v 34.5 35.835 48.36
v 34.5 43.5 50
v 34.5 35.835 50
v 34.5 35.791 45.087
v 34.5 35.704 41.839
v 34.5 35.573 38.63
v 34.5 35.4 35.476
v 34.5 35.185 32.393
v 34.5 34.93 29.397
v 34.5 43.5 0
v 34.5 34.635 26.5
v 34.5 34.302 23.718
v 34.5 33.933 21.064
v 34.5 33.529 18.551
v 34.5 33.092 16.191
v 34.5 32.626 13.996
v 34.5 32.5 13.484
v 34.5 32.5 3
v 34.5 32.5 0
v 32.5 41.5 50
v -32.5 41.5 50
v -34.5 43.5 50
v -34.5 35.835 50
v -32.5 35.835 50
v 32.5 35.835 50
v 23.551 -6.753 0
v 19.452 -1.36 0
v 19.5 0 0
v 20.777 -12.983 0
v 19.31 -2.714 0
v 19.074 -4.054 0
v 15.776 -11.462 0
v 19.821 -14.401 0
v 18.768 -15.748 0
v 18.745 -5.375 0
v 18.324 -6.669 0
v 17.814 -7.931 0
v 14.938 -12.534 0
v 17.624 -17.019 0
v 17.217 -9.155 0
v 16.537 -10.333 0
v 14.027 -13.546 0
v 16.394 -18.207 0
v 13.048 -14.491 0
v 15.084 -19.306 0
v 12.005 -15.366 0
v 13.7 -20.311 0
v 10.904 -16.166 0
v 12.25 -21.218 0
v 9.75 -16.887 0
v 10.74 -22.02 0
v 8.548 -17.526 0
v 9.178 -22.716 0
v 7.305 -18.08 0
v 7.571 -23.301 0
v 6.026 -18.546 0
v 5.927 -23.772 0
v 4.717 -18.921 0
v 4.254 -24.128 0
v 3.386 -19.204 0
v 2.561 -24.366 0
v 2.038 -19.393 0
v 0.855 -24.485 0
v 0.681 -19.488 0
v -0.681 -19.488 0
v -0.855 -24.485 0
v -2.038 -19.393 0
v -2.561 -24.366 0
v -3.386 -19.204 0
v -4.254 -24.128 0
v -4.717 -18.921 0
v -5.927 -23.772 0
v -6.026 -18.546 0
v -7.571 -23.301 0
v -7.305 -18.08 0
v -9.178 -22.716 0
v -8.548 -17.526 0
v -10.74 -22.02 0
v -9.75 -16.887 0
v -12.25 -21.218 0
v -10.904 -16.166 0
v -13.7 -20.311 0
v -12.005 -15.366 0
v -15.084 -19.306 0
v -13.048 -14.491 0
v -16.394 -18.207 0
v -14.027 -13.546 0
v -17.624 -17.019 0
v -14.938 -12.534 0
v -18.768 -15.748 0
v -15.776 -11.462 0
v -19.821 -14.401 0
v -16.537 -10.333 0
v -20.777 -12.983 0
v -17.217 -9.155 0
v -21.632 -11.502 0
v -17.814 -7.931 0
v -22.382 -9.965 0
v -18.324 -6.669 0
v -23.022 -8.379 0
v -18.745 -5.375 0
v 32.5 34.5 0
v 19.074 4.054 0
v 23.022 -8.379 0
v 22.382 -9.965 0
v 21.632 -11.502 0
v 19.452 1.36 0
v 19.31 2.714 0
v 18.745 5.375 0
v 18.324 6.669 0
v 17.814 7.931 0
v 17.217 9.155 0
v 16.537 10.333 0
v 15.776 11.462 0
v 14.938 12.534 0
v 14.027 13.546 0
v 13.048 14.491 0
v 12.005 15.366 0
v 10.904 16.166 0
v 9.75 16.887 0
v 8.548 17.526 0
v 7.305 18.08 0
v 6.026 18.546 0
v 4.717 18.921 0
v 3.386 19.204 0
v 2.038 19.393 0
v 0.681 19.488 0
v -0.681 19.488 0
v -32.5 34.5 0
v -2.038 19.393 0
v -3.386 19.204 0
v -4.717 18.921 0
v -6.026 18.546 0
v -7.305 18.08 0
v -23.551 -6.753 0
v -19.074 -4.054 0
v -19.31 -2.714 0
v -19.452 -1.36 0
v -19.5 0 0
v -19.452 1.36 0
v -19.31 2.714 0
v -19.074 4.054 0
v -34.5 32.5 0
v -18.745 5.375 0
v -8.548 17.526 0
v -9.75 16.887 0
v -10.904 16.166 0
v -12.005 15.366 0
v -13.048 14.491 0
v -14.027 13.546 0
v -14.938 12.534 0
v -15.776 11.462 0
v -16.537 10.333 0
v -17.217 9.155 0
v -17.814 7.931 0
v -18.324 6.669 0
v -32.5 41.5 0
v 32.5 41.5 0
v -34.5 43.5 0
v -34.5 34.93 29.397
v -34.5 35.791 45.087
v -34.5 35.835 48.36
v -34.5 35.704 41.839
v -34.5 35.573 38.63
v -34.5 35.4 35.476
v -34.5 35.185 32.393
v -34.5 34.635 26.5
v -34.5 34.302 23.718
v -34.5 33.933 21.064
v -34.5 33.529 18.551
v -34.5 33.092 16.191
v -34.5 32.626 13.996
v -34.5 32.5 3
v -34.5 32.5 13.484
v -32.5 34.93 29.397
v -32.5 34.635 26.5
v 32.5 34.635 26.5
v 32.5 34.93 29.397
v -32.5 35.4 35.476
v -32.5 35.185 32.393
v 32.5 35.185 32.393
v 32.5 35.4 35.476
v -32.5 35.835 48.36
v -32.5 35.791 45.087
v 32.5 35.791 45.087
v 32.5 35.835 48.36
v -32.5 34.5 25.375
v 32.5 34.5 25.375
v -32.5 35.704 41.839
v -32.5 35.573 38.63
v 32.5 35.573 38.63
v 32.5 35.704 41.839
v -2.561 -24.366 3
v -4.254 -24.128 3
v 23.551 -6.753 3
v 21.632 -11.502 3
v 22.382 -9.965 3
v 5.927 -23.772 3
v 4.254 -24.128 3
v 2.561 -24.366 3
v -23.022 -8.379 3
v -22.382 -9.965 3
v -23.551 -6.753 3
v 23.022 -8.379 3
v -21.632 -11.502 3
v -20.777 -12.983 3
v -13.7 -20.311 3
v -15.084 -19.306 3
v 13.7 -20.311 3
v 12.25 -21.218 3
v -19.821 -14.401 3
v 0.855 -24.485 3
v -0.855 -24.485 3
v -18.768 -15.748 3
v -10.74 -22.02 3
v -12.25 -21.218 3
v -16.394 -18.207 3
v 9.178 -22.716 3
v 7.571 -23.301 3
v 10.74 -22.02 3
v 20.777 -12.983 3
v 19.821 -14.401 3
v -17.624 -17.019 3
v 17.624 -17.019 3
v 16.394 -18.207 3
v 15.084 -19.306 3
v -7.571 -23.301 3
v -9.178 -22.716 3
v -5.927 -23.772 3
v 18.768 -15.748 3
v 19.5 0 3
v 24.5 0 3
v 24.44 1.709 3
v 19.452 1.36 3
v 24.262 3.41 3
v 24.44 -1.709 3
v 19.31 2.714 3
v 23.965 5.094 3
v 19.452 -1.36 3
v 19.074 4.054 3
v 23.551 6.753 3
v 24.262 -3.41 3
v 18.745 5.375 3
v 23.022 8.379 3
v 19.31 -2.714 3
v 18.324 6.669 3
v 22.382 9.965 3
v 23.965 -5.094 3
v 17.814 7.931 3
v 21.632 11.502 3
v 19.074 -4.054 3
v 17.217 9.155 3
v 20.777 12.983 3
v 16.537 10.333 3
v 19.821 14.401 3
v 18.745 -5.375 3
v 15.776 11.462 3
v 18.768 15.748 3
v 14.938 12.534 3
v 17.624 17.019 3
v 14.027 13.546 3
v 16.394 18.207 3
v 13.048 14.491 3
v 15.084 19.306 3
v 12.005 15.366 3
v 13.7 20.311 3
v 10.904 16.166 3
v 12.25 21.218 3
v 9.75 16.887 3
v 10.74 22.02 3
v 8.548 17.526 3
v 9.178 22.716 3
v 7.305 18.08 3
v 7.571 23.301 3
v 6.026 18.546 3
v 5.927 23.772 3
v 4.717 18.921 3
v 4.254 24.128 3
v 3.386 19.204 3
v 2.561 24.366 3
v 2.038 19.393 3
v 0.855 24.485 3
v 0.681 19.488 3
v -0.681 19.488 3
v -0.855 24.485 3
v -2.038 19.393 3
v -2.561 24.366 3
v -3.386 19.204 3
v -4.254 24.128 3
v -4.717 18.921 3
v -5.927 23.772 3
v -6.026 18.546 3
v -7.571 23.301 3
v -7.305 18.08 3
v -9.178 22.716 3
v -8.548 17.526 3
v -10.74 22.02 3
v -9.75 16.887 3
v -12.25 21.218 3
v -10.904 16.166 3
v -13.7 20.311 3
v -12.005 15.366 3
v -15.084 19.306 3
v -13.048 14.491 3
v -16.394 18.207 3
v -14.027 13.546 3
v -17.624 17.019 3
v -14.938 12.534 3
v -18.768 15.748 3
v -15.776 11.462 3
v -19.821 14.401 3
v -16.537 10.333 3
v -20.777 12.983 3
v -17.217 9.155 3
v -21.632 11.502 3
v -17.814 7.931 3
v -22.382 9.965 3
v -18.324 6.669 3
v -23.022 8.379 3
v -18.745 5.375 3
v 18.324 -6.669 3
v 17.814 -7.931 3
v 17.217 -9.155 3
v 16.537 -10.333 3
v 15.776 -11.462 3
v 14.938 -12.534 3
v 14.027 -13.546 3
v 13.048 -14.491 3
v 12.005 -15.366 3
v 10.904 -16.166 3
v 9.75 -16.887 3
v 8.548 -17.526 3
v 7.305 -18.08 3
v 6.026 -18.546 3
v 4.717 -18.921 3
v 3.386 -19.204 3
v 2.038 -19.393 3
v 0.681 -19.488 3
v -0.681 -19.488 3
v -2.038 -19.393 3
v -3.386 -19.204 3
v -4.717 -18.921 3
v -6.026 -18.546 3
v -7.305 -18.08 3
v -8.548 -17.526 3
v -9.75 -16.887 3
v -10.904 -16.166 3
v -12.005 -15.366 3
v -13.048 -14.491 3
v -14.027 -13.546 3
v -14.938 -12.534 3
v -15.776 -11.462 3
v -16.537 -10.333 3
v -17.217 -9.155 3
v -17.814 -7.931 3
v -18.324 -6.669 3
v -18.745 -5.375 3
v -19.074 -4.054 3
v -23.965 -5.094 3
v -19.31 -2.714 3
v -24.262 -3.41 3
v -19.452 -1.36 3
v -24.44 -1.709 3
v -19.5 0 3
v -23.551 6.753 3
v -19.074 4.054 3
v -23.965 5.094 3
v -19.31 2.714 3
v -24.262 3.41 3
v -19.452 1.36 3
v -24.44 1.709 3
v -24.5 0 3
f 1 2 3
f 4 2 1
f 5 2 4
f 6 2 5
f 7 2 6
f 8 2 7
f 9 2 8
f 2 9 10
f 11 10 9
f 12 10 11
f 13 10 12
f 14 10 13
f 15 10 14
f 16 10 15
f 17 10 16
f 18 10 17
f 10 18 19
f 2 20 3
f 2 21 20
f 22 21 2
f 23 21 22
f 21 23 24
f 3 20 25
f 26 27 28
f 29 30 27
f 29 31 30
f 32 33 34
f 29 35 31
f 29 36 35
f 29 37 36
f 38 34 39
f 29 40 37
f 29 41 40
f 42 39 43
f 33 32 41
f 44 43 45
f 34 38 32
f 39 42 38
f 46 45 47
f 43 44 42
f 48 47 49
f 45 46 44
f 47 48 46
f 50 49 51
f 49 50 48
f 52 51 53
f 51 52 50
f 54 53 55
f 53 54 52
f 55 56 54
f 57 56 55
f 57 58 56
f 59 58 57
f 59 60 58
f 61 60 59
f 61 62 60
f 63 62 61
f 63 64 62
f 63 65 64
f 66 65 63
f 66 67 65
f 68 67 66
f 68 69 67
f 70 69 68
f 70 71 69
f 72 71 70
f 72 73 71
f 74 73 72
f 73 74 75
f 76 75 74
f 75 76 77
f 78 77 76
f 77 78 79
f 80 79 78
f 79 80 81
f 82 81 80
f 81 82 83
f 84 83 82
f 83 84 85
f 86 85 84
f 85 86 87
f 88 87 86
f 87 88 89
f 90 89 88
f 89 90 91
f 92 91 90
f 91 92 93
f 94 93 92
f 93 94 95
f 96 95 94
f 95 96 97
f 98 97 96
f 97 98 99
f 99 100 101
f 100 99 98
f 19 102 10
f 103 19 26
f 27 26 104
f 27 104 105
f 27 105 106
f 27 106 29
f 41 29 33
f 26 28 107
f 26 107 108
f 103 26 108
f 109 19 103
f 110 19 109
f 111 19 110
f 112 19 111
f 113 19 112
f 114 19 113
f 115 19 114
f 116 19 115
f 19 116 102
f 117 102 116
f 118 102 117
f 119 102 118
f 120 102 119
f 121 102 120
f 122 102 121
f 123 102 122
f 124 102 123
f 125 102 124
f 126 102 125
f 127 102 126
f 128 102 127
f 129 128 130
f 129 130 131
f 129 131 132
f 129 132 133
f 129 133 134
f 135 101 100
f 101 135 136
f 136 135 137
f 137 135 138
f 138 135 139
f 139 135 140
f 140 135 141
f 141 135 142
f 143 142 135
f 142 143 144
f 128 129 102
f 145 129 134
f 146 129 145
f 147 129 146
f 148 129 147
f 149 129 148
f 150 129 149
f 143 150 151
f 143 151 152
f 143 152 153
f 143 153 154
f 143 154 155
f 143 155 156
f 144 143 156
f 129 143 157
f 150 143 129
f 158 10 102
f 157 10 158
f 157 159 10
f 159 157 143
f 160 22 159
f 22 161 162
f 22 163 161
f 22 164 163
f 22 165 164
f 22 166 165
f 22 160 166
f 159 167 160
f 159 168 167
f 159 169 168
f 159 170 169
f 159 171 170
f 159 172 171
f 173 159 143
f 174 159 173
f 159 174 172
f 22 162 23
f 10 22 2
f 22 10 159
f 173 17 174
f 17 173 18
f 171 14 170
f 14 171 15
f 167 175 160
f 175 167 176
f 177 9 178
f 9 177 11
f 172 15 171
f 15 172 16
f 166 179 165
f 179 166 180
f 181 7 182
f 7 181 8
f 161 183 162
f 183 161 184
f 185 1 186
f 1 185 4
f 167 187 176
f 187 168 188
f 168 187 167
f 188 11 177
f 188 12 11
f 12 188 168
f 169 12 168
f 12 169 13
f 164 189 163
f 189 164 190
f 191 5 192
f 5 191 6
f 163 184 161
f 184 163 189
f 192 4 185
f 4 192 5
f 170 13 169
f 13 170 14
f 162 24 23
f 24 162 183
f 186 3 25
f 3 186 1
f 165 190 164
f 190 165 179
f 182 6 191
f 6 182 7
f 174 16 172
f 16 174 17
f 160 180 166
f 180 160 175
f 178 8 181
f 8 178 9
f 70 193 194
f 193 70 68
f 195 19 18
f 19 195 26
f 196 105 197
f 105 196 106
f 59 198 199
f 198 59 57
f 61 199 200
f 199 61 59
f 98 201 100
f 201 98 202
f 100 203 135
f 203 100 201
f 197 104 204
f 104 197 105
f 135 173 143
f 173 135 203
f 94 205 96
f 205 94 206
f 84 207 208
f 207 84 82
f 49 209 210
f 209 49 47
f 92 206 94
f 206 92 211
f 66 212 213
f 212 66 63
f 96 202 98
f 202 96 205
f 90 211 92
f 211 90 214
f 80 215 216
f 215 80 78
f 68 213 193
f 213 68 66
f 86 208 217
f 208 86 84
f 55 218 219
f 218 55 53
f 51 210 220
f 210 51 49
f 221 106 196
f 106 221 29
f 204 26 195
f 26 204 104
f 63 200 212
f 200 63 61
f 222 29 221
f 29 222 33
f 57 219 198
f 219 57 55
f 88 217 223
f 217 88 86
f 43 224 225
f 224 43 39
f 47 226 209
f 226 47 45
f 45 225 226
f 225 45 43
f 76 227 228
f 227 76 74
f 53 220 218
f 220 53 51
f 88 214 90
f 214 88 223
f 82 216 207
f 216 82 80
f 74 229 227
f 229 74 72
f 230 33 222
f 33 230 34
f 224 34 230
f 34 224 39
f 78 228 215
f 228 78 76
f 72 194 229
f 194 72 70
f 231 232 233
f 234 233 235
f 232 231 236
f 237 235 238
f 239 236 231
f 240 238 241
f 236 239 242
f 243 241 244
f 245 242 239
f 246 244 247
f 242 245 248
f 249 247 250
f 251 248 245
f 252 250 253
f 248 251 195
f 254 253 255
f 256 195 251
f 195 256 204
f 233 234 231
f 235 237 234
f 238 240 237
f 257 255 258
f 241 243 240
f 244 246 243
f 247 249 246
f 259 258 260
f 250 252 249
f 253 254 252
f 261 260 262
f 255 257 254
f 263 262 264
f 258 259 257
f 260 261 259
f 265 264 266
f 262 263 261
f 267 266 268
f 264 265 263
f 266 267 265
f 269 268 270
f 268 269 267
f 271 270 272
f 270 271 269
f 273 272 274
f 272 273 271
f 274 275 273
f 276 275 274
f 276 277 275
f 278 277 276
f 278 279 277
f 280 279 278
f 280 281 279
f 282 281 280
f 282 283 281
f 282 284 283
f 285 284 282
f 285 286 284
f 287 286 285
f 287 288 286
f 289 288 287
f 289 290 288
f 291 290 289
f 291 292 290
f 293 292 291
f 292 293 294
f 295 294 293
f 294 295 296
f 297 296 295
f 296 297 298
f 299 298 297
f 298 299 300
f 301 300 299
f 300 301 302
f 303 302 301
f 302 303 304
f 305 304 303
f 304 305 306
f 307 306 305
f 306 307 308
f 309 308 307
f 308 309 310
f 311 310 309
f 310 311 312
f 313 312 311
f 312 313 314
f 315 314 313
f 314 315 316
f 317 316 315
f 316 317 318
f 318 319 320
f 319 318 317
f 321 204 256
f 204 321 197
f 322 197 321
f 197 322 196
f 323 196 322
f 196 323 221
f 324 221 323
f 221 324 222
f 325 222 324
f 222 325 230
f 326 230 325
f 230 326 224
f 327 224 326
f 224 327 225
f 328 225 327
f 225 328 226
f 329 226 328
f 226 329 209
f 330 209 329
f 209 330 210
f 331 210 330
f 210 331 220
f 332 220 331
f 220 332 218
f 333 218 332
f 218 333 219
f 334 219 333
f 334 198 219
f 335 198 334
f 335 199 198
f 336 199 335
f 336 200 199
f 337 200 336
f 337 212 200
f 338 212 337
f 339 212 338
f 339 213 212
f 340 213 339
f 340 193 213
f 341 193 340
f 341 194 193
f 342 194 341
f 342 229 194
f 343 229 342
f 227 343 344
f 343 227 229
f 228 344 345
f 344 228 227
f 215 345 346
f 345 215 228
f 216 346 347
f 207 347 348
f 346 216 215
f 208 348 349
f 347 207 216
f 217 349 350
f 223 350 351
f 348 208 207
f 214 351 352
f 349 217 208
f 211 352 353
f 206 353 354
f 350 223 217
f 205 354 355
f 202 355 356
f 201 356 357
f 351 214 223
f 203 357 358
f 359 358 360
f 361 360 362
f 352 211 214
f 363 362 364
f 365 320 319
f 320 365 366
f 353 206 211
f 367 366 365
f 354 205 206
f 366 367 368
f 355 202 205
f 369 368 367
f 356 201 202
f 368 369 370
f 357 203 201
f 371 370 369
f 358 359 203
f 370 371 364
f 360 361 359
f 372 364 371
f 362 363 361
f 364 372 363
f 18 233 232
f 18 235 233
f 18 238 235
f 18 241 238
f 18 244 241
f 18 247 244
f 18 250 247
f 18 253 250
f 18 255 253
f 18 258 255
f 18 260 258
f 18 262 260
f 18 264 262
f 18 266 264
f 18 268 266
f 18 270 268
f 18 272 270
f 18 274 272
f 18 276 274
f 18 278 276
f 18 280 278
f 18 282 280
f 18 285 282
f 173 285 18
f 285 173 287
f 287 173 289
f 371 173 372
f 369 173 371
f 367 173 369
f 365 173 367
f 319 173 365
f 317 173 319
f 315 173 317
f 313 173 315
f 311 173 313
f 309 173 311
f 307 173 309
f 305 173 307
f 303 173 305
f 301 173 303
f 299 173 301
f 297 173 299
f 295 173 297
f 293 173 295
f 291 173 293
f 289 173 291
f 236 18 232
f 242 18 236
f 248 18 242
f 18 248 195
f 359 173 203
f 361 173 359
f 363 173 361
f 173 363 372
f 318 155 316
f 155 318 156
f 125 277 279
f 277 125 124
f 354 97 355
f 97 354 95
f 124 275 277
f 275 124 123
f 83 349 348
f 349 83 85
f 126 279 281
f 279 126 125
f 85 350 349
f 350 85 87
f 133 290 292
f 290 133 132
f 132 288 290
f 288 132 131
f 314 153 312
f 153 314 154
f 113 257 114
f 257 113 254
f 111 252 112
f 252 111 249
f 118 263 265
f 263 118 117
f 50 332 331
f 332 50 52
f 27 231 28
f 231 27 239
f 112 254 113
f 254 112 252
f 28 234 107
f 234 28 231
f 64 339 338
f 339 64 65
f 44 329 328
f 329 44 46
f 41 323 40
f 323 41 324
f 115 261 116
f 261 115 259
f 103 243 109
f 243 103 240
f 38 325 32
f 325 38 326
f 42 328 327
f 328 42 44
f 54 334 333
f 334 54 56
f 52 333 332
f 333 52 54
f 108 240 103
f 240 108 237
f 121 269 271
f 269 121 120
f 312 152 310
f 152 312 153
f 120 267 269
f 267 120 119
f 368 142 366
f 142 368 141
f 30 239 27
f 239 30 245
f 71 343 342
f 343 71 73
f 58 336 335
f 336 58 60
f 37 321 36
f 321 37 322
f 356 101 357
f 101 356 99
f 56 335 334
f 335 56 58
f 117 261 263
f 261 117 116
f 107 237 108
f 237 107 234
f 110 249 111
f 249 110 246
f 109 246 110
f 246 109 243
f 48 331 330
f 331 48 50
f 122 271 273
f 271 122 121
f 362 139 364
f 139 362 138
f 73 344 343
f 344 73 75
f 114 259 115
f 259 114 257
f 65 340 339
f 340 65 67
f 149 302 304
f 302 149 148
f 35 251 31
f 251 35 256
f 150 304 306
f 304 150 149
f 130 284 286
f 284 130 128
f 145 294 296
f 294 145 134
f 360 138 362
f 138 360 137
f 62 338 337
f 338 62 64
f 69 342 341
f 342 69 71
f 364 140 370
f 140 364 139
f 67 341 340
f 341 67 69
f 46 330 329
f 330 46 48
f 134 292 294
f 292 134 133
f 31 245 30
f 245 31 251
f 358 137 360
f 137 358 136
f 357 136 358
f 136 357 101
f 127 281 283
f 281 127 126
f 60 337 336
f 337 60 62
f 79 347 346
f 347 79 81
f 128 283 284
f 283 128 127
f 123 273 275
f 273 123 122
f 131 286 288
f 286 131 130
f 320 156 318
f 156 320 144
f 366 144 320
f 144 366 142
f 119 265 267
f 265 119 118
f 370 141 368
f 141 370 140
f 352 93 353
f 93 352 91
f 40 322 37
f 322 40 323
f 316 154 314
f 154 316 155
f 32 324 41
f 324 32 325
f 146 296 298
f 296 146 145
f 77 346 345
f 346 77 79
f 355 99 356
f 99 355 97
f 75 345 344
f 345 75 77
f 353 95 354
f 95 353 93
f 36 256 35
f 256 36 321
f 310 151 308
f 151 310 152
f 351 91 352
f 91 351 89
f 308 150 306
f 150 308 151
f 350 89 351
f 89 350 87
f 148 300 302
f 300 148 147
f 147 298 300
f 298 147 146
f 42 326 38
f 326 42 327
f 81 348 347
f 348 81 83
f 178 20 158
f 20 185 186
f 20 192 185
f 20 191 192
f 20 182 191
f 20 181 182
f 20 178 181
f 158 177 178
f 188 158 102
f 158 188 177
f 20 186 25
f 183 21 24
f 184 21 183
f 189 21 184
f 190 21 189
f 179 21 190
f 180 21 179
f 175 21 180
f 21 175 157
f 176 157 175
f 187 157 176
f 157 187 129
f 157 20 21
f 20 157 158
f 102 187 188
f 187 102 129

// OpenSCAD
socket=39;
socket_wall=5;
socket_h=3;

bulb=65;
pad=0.1;
$fn=90;

clip=20;
clip_x=bulb;
clip_y=7;
clip_z=50;
clip_wall=2;

module socket(padding=0, wall=0) {
    translate([0,0,-padding])
    cylinder(d=socket+wall*2,h=socket_h+padding*2);
}

module curve() {
    r=clip_z-socket_h;
    #scale([1,(clip_y+clip_wall)/r,1])
    translate([-clip_wall-pad,clip_y-r,clip_z])
    rotate([0,90,0])
    cylinder(r=r,h=clip_x+clip_wall*2+pad*2);
}

module clip(padding=0, wall=0) {
        translate([-clip_x/2,bulb/2+clip_wall,0])
        difference() {
            translate([-wall,-wall,-padding])
            cube([clip_x+wall*2,clip_y+wall*2,clip_z+padding*2]);
            if (wall==clip_wall) {
                hull() {
                    translate([0,-clip_y,0])
                    curve();
                    curve();
                }
            }
        }
}

module connection() {
    difference() {
        hull() {
            socket(wall=socket_wall);
            clip(wall=clip_wall);
        }
        translate([0,0,socket_h])
        hull() {
            socket(wall=socket_wall+pad);
            clip(wall=clip_wall+pad);
        }
    }
}

module positive() {
    socket(wall=socket_wall);
    clip(wall=clip_wall);
    connection();
}

module negative() {
    socket(padding=pad);
    clip(padding=pad);
}

module assembled() {
    difference() {
        positive();
        negative();
    }
}

assembled();
